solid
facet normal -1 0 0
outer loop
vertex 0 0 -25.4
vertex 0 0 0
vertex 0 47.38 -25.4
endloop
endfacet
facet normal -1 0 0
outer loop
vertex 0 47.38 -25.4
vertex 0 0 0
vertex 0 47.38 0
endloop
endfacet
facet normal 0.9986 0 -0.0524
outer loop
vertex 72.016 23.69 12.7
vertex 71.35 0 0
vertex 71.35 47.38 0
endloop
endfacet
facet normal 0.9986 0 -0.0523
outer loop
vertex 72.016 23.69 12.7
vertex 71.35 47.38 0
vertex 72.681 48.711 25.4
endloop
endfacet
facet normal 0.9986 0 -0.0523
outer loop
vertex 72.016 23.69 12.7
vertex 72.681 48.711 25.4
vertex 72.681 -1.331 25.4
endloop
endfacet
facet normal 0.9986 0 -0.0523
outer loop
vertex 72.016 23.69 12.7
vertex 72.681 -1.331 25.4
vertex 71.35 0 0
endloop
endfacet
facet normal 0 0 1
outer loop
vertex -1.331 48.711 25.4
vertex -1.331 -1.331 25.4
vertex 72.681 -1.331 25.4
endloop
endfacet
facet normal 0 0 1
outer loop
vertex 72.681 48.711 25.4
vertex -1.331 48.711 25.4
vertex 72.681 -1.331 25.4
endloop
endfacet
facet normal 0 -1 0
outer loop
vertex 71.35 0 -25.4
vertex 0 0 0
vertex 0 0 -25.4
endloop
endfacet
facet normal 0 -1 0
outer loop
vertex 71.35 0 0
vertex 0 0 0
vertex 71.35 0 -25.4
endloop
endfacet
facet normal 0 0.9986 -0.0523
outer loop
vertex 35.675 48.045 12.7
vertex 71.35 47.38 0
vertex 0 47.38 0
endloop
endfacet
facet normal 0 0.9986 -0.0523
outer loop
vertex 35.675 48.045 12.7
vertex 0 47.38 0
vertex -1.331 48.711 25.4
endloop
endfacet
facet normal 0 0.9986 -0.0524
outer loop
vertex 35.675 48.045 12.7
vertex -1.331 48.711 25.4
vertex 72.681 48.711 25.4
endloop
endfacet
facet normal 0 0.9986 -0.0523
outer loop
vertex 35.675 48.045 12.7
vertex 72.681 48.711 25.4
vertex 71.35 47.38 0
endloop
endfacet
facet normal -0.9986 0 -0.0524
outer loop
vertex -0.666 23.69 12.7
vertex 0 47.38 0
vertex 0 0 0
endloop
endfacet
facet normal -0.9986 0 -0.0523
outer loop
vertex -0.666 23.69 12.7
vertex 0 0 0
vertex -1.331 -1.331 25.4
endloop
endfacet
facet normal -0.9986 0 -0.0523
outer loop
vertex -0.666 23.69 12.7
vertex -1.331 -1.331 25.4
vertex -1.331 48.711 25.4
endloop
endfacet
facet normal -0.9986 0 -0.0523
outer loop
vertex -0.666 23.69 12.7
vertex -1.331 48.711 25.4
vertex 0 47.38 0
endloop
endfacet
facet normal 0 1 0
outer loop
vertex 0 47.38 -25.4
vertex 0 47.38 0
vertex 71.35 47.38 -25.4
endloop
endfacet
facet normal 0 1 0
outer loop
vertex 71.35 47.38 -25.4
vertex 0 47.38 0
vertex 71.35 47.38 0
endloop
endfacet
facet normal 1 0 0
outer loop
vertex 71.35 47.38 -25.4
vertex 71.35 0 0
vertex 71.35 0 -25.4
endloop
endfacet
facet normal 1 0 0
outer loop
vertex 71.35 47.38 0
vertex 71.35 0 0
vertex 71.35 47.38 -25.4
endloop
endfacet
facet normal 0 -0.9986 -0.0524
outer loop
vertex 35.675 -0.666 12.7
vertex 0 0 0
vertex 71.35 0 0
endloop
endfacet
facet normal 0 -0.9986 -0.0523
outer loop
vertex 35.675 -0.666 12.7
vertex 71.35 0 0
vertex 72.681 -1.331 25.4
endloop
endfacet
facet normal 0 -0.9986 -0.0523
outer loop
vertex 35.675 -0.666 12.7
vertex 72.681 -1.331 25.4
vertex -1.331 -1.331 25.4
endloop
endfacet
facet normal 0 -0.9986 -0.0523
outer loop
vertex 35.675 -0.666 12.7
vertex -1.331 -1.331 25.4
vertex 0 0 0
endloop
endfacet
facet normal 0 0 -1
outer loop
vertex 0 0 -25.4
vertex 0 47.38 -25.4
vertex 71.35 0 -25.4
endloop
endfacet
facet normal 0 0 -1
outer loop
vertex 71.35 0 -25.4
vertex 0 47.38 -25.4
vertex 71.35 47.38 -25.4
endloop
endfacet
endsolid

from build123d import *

# Parameters (mm, degrees)
F0_W          = 71.3502541184
F0_H          = 47.3797805607
F1_DEPTH      = 25.4
F1_TAPER      = -3
F1_DEPTH_BACK = 25.4


with BuildPart() as f1:
    # F0 (on Top) → F1 (new body, two sides)
    with BuildSketch(Plane.XY) as f1_sk:
        with Locations((35.6751270592, 23.6898902804)):
            Rectangle(F0_W, F0_H)
    extrude(amount=F1_DEPTH, taper=F1_TAPER)
    extrude(f1_sk.sketch, amount=-F1_DEPTH_BACK)


solid = f1.part
